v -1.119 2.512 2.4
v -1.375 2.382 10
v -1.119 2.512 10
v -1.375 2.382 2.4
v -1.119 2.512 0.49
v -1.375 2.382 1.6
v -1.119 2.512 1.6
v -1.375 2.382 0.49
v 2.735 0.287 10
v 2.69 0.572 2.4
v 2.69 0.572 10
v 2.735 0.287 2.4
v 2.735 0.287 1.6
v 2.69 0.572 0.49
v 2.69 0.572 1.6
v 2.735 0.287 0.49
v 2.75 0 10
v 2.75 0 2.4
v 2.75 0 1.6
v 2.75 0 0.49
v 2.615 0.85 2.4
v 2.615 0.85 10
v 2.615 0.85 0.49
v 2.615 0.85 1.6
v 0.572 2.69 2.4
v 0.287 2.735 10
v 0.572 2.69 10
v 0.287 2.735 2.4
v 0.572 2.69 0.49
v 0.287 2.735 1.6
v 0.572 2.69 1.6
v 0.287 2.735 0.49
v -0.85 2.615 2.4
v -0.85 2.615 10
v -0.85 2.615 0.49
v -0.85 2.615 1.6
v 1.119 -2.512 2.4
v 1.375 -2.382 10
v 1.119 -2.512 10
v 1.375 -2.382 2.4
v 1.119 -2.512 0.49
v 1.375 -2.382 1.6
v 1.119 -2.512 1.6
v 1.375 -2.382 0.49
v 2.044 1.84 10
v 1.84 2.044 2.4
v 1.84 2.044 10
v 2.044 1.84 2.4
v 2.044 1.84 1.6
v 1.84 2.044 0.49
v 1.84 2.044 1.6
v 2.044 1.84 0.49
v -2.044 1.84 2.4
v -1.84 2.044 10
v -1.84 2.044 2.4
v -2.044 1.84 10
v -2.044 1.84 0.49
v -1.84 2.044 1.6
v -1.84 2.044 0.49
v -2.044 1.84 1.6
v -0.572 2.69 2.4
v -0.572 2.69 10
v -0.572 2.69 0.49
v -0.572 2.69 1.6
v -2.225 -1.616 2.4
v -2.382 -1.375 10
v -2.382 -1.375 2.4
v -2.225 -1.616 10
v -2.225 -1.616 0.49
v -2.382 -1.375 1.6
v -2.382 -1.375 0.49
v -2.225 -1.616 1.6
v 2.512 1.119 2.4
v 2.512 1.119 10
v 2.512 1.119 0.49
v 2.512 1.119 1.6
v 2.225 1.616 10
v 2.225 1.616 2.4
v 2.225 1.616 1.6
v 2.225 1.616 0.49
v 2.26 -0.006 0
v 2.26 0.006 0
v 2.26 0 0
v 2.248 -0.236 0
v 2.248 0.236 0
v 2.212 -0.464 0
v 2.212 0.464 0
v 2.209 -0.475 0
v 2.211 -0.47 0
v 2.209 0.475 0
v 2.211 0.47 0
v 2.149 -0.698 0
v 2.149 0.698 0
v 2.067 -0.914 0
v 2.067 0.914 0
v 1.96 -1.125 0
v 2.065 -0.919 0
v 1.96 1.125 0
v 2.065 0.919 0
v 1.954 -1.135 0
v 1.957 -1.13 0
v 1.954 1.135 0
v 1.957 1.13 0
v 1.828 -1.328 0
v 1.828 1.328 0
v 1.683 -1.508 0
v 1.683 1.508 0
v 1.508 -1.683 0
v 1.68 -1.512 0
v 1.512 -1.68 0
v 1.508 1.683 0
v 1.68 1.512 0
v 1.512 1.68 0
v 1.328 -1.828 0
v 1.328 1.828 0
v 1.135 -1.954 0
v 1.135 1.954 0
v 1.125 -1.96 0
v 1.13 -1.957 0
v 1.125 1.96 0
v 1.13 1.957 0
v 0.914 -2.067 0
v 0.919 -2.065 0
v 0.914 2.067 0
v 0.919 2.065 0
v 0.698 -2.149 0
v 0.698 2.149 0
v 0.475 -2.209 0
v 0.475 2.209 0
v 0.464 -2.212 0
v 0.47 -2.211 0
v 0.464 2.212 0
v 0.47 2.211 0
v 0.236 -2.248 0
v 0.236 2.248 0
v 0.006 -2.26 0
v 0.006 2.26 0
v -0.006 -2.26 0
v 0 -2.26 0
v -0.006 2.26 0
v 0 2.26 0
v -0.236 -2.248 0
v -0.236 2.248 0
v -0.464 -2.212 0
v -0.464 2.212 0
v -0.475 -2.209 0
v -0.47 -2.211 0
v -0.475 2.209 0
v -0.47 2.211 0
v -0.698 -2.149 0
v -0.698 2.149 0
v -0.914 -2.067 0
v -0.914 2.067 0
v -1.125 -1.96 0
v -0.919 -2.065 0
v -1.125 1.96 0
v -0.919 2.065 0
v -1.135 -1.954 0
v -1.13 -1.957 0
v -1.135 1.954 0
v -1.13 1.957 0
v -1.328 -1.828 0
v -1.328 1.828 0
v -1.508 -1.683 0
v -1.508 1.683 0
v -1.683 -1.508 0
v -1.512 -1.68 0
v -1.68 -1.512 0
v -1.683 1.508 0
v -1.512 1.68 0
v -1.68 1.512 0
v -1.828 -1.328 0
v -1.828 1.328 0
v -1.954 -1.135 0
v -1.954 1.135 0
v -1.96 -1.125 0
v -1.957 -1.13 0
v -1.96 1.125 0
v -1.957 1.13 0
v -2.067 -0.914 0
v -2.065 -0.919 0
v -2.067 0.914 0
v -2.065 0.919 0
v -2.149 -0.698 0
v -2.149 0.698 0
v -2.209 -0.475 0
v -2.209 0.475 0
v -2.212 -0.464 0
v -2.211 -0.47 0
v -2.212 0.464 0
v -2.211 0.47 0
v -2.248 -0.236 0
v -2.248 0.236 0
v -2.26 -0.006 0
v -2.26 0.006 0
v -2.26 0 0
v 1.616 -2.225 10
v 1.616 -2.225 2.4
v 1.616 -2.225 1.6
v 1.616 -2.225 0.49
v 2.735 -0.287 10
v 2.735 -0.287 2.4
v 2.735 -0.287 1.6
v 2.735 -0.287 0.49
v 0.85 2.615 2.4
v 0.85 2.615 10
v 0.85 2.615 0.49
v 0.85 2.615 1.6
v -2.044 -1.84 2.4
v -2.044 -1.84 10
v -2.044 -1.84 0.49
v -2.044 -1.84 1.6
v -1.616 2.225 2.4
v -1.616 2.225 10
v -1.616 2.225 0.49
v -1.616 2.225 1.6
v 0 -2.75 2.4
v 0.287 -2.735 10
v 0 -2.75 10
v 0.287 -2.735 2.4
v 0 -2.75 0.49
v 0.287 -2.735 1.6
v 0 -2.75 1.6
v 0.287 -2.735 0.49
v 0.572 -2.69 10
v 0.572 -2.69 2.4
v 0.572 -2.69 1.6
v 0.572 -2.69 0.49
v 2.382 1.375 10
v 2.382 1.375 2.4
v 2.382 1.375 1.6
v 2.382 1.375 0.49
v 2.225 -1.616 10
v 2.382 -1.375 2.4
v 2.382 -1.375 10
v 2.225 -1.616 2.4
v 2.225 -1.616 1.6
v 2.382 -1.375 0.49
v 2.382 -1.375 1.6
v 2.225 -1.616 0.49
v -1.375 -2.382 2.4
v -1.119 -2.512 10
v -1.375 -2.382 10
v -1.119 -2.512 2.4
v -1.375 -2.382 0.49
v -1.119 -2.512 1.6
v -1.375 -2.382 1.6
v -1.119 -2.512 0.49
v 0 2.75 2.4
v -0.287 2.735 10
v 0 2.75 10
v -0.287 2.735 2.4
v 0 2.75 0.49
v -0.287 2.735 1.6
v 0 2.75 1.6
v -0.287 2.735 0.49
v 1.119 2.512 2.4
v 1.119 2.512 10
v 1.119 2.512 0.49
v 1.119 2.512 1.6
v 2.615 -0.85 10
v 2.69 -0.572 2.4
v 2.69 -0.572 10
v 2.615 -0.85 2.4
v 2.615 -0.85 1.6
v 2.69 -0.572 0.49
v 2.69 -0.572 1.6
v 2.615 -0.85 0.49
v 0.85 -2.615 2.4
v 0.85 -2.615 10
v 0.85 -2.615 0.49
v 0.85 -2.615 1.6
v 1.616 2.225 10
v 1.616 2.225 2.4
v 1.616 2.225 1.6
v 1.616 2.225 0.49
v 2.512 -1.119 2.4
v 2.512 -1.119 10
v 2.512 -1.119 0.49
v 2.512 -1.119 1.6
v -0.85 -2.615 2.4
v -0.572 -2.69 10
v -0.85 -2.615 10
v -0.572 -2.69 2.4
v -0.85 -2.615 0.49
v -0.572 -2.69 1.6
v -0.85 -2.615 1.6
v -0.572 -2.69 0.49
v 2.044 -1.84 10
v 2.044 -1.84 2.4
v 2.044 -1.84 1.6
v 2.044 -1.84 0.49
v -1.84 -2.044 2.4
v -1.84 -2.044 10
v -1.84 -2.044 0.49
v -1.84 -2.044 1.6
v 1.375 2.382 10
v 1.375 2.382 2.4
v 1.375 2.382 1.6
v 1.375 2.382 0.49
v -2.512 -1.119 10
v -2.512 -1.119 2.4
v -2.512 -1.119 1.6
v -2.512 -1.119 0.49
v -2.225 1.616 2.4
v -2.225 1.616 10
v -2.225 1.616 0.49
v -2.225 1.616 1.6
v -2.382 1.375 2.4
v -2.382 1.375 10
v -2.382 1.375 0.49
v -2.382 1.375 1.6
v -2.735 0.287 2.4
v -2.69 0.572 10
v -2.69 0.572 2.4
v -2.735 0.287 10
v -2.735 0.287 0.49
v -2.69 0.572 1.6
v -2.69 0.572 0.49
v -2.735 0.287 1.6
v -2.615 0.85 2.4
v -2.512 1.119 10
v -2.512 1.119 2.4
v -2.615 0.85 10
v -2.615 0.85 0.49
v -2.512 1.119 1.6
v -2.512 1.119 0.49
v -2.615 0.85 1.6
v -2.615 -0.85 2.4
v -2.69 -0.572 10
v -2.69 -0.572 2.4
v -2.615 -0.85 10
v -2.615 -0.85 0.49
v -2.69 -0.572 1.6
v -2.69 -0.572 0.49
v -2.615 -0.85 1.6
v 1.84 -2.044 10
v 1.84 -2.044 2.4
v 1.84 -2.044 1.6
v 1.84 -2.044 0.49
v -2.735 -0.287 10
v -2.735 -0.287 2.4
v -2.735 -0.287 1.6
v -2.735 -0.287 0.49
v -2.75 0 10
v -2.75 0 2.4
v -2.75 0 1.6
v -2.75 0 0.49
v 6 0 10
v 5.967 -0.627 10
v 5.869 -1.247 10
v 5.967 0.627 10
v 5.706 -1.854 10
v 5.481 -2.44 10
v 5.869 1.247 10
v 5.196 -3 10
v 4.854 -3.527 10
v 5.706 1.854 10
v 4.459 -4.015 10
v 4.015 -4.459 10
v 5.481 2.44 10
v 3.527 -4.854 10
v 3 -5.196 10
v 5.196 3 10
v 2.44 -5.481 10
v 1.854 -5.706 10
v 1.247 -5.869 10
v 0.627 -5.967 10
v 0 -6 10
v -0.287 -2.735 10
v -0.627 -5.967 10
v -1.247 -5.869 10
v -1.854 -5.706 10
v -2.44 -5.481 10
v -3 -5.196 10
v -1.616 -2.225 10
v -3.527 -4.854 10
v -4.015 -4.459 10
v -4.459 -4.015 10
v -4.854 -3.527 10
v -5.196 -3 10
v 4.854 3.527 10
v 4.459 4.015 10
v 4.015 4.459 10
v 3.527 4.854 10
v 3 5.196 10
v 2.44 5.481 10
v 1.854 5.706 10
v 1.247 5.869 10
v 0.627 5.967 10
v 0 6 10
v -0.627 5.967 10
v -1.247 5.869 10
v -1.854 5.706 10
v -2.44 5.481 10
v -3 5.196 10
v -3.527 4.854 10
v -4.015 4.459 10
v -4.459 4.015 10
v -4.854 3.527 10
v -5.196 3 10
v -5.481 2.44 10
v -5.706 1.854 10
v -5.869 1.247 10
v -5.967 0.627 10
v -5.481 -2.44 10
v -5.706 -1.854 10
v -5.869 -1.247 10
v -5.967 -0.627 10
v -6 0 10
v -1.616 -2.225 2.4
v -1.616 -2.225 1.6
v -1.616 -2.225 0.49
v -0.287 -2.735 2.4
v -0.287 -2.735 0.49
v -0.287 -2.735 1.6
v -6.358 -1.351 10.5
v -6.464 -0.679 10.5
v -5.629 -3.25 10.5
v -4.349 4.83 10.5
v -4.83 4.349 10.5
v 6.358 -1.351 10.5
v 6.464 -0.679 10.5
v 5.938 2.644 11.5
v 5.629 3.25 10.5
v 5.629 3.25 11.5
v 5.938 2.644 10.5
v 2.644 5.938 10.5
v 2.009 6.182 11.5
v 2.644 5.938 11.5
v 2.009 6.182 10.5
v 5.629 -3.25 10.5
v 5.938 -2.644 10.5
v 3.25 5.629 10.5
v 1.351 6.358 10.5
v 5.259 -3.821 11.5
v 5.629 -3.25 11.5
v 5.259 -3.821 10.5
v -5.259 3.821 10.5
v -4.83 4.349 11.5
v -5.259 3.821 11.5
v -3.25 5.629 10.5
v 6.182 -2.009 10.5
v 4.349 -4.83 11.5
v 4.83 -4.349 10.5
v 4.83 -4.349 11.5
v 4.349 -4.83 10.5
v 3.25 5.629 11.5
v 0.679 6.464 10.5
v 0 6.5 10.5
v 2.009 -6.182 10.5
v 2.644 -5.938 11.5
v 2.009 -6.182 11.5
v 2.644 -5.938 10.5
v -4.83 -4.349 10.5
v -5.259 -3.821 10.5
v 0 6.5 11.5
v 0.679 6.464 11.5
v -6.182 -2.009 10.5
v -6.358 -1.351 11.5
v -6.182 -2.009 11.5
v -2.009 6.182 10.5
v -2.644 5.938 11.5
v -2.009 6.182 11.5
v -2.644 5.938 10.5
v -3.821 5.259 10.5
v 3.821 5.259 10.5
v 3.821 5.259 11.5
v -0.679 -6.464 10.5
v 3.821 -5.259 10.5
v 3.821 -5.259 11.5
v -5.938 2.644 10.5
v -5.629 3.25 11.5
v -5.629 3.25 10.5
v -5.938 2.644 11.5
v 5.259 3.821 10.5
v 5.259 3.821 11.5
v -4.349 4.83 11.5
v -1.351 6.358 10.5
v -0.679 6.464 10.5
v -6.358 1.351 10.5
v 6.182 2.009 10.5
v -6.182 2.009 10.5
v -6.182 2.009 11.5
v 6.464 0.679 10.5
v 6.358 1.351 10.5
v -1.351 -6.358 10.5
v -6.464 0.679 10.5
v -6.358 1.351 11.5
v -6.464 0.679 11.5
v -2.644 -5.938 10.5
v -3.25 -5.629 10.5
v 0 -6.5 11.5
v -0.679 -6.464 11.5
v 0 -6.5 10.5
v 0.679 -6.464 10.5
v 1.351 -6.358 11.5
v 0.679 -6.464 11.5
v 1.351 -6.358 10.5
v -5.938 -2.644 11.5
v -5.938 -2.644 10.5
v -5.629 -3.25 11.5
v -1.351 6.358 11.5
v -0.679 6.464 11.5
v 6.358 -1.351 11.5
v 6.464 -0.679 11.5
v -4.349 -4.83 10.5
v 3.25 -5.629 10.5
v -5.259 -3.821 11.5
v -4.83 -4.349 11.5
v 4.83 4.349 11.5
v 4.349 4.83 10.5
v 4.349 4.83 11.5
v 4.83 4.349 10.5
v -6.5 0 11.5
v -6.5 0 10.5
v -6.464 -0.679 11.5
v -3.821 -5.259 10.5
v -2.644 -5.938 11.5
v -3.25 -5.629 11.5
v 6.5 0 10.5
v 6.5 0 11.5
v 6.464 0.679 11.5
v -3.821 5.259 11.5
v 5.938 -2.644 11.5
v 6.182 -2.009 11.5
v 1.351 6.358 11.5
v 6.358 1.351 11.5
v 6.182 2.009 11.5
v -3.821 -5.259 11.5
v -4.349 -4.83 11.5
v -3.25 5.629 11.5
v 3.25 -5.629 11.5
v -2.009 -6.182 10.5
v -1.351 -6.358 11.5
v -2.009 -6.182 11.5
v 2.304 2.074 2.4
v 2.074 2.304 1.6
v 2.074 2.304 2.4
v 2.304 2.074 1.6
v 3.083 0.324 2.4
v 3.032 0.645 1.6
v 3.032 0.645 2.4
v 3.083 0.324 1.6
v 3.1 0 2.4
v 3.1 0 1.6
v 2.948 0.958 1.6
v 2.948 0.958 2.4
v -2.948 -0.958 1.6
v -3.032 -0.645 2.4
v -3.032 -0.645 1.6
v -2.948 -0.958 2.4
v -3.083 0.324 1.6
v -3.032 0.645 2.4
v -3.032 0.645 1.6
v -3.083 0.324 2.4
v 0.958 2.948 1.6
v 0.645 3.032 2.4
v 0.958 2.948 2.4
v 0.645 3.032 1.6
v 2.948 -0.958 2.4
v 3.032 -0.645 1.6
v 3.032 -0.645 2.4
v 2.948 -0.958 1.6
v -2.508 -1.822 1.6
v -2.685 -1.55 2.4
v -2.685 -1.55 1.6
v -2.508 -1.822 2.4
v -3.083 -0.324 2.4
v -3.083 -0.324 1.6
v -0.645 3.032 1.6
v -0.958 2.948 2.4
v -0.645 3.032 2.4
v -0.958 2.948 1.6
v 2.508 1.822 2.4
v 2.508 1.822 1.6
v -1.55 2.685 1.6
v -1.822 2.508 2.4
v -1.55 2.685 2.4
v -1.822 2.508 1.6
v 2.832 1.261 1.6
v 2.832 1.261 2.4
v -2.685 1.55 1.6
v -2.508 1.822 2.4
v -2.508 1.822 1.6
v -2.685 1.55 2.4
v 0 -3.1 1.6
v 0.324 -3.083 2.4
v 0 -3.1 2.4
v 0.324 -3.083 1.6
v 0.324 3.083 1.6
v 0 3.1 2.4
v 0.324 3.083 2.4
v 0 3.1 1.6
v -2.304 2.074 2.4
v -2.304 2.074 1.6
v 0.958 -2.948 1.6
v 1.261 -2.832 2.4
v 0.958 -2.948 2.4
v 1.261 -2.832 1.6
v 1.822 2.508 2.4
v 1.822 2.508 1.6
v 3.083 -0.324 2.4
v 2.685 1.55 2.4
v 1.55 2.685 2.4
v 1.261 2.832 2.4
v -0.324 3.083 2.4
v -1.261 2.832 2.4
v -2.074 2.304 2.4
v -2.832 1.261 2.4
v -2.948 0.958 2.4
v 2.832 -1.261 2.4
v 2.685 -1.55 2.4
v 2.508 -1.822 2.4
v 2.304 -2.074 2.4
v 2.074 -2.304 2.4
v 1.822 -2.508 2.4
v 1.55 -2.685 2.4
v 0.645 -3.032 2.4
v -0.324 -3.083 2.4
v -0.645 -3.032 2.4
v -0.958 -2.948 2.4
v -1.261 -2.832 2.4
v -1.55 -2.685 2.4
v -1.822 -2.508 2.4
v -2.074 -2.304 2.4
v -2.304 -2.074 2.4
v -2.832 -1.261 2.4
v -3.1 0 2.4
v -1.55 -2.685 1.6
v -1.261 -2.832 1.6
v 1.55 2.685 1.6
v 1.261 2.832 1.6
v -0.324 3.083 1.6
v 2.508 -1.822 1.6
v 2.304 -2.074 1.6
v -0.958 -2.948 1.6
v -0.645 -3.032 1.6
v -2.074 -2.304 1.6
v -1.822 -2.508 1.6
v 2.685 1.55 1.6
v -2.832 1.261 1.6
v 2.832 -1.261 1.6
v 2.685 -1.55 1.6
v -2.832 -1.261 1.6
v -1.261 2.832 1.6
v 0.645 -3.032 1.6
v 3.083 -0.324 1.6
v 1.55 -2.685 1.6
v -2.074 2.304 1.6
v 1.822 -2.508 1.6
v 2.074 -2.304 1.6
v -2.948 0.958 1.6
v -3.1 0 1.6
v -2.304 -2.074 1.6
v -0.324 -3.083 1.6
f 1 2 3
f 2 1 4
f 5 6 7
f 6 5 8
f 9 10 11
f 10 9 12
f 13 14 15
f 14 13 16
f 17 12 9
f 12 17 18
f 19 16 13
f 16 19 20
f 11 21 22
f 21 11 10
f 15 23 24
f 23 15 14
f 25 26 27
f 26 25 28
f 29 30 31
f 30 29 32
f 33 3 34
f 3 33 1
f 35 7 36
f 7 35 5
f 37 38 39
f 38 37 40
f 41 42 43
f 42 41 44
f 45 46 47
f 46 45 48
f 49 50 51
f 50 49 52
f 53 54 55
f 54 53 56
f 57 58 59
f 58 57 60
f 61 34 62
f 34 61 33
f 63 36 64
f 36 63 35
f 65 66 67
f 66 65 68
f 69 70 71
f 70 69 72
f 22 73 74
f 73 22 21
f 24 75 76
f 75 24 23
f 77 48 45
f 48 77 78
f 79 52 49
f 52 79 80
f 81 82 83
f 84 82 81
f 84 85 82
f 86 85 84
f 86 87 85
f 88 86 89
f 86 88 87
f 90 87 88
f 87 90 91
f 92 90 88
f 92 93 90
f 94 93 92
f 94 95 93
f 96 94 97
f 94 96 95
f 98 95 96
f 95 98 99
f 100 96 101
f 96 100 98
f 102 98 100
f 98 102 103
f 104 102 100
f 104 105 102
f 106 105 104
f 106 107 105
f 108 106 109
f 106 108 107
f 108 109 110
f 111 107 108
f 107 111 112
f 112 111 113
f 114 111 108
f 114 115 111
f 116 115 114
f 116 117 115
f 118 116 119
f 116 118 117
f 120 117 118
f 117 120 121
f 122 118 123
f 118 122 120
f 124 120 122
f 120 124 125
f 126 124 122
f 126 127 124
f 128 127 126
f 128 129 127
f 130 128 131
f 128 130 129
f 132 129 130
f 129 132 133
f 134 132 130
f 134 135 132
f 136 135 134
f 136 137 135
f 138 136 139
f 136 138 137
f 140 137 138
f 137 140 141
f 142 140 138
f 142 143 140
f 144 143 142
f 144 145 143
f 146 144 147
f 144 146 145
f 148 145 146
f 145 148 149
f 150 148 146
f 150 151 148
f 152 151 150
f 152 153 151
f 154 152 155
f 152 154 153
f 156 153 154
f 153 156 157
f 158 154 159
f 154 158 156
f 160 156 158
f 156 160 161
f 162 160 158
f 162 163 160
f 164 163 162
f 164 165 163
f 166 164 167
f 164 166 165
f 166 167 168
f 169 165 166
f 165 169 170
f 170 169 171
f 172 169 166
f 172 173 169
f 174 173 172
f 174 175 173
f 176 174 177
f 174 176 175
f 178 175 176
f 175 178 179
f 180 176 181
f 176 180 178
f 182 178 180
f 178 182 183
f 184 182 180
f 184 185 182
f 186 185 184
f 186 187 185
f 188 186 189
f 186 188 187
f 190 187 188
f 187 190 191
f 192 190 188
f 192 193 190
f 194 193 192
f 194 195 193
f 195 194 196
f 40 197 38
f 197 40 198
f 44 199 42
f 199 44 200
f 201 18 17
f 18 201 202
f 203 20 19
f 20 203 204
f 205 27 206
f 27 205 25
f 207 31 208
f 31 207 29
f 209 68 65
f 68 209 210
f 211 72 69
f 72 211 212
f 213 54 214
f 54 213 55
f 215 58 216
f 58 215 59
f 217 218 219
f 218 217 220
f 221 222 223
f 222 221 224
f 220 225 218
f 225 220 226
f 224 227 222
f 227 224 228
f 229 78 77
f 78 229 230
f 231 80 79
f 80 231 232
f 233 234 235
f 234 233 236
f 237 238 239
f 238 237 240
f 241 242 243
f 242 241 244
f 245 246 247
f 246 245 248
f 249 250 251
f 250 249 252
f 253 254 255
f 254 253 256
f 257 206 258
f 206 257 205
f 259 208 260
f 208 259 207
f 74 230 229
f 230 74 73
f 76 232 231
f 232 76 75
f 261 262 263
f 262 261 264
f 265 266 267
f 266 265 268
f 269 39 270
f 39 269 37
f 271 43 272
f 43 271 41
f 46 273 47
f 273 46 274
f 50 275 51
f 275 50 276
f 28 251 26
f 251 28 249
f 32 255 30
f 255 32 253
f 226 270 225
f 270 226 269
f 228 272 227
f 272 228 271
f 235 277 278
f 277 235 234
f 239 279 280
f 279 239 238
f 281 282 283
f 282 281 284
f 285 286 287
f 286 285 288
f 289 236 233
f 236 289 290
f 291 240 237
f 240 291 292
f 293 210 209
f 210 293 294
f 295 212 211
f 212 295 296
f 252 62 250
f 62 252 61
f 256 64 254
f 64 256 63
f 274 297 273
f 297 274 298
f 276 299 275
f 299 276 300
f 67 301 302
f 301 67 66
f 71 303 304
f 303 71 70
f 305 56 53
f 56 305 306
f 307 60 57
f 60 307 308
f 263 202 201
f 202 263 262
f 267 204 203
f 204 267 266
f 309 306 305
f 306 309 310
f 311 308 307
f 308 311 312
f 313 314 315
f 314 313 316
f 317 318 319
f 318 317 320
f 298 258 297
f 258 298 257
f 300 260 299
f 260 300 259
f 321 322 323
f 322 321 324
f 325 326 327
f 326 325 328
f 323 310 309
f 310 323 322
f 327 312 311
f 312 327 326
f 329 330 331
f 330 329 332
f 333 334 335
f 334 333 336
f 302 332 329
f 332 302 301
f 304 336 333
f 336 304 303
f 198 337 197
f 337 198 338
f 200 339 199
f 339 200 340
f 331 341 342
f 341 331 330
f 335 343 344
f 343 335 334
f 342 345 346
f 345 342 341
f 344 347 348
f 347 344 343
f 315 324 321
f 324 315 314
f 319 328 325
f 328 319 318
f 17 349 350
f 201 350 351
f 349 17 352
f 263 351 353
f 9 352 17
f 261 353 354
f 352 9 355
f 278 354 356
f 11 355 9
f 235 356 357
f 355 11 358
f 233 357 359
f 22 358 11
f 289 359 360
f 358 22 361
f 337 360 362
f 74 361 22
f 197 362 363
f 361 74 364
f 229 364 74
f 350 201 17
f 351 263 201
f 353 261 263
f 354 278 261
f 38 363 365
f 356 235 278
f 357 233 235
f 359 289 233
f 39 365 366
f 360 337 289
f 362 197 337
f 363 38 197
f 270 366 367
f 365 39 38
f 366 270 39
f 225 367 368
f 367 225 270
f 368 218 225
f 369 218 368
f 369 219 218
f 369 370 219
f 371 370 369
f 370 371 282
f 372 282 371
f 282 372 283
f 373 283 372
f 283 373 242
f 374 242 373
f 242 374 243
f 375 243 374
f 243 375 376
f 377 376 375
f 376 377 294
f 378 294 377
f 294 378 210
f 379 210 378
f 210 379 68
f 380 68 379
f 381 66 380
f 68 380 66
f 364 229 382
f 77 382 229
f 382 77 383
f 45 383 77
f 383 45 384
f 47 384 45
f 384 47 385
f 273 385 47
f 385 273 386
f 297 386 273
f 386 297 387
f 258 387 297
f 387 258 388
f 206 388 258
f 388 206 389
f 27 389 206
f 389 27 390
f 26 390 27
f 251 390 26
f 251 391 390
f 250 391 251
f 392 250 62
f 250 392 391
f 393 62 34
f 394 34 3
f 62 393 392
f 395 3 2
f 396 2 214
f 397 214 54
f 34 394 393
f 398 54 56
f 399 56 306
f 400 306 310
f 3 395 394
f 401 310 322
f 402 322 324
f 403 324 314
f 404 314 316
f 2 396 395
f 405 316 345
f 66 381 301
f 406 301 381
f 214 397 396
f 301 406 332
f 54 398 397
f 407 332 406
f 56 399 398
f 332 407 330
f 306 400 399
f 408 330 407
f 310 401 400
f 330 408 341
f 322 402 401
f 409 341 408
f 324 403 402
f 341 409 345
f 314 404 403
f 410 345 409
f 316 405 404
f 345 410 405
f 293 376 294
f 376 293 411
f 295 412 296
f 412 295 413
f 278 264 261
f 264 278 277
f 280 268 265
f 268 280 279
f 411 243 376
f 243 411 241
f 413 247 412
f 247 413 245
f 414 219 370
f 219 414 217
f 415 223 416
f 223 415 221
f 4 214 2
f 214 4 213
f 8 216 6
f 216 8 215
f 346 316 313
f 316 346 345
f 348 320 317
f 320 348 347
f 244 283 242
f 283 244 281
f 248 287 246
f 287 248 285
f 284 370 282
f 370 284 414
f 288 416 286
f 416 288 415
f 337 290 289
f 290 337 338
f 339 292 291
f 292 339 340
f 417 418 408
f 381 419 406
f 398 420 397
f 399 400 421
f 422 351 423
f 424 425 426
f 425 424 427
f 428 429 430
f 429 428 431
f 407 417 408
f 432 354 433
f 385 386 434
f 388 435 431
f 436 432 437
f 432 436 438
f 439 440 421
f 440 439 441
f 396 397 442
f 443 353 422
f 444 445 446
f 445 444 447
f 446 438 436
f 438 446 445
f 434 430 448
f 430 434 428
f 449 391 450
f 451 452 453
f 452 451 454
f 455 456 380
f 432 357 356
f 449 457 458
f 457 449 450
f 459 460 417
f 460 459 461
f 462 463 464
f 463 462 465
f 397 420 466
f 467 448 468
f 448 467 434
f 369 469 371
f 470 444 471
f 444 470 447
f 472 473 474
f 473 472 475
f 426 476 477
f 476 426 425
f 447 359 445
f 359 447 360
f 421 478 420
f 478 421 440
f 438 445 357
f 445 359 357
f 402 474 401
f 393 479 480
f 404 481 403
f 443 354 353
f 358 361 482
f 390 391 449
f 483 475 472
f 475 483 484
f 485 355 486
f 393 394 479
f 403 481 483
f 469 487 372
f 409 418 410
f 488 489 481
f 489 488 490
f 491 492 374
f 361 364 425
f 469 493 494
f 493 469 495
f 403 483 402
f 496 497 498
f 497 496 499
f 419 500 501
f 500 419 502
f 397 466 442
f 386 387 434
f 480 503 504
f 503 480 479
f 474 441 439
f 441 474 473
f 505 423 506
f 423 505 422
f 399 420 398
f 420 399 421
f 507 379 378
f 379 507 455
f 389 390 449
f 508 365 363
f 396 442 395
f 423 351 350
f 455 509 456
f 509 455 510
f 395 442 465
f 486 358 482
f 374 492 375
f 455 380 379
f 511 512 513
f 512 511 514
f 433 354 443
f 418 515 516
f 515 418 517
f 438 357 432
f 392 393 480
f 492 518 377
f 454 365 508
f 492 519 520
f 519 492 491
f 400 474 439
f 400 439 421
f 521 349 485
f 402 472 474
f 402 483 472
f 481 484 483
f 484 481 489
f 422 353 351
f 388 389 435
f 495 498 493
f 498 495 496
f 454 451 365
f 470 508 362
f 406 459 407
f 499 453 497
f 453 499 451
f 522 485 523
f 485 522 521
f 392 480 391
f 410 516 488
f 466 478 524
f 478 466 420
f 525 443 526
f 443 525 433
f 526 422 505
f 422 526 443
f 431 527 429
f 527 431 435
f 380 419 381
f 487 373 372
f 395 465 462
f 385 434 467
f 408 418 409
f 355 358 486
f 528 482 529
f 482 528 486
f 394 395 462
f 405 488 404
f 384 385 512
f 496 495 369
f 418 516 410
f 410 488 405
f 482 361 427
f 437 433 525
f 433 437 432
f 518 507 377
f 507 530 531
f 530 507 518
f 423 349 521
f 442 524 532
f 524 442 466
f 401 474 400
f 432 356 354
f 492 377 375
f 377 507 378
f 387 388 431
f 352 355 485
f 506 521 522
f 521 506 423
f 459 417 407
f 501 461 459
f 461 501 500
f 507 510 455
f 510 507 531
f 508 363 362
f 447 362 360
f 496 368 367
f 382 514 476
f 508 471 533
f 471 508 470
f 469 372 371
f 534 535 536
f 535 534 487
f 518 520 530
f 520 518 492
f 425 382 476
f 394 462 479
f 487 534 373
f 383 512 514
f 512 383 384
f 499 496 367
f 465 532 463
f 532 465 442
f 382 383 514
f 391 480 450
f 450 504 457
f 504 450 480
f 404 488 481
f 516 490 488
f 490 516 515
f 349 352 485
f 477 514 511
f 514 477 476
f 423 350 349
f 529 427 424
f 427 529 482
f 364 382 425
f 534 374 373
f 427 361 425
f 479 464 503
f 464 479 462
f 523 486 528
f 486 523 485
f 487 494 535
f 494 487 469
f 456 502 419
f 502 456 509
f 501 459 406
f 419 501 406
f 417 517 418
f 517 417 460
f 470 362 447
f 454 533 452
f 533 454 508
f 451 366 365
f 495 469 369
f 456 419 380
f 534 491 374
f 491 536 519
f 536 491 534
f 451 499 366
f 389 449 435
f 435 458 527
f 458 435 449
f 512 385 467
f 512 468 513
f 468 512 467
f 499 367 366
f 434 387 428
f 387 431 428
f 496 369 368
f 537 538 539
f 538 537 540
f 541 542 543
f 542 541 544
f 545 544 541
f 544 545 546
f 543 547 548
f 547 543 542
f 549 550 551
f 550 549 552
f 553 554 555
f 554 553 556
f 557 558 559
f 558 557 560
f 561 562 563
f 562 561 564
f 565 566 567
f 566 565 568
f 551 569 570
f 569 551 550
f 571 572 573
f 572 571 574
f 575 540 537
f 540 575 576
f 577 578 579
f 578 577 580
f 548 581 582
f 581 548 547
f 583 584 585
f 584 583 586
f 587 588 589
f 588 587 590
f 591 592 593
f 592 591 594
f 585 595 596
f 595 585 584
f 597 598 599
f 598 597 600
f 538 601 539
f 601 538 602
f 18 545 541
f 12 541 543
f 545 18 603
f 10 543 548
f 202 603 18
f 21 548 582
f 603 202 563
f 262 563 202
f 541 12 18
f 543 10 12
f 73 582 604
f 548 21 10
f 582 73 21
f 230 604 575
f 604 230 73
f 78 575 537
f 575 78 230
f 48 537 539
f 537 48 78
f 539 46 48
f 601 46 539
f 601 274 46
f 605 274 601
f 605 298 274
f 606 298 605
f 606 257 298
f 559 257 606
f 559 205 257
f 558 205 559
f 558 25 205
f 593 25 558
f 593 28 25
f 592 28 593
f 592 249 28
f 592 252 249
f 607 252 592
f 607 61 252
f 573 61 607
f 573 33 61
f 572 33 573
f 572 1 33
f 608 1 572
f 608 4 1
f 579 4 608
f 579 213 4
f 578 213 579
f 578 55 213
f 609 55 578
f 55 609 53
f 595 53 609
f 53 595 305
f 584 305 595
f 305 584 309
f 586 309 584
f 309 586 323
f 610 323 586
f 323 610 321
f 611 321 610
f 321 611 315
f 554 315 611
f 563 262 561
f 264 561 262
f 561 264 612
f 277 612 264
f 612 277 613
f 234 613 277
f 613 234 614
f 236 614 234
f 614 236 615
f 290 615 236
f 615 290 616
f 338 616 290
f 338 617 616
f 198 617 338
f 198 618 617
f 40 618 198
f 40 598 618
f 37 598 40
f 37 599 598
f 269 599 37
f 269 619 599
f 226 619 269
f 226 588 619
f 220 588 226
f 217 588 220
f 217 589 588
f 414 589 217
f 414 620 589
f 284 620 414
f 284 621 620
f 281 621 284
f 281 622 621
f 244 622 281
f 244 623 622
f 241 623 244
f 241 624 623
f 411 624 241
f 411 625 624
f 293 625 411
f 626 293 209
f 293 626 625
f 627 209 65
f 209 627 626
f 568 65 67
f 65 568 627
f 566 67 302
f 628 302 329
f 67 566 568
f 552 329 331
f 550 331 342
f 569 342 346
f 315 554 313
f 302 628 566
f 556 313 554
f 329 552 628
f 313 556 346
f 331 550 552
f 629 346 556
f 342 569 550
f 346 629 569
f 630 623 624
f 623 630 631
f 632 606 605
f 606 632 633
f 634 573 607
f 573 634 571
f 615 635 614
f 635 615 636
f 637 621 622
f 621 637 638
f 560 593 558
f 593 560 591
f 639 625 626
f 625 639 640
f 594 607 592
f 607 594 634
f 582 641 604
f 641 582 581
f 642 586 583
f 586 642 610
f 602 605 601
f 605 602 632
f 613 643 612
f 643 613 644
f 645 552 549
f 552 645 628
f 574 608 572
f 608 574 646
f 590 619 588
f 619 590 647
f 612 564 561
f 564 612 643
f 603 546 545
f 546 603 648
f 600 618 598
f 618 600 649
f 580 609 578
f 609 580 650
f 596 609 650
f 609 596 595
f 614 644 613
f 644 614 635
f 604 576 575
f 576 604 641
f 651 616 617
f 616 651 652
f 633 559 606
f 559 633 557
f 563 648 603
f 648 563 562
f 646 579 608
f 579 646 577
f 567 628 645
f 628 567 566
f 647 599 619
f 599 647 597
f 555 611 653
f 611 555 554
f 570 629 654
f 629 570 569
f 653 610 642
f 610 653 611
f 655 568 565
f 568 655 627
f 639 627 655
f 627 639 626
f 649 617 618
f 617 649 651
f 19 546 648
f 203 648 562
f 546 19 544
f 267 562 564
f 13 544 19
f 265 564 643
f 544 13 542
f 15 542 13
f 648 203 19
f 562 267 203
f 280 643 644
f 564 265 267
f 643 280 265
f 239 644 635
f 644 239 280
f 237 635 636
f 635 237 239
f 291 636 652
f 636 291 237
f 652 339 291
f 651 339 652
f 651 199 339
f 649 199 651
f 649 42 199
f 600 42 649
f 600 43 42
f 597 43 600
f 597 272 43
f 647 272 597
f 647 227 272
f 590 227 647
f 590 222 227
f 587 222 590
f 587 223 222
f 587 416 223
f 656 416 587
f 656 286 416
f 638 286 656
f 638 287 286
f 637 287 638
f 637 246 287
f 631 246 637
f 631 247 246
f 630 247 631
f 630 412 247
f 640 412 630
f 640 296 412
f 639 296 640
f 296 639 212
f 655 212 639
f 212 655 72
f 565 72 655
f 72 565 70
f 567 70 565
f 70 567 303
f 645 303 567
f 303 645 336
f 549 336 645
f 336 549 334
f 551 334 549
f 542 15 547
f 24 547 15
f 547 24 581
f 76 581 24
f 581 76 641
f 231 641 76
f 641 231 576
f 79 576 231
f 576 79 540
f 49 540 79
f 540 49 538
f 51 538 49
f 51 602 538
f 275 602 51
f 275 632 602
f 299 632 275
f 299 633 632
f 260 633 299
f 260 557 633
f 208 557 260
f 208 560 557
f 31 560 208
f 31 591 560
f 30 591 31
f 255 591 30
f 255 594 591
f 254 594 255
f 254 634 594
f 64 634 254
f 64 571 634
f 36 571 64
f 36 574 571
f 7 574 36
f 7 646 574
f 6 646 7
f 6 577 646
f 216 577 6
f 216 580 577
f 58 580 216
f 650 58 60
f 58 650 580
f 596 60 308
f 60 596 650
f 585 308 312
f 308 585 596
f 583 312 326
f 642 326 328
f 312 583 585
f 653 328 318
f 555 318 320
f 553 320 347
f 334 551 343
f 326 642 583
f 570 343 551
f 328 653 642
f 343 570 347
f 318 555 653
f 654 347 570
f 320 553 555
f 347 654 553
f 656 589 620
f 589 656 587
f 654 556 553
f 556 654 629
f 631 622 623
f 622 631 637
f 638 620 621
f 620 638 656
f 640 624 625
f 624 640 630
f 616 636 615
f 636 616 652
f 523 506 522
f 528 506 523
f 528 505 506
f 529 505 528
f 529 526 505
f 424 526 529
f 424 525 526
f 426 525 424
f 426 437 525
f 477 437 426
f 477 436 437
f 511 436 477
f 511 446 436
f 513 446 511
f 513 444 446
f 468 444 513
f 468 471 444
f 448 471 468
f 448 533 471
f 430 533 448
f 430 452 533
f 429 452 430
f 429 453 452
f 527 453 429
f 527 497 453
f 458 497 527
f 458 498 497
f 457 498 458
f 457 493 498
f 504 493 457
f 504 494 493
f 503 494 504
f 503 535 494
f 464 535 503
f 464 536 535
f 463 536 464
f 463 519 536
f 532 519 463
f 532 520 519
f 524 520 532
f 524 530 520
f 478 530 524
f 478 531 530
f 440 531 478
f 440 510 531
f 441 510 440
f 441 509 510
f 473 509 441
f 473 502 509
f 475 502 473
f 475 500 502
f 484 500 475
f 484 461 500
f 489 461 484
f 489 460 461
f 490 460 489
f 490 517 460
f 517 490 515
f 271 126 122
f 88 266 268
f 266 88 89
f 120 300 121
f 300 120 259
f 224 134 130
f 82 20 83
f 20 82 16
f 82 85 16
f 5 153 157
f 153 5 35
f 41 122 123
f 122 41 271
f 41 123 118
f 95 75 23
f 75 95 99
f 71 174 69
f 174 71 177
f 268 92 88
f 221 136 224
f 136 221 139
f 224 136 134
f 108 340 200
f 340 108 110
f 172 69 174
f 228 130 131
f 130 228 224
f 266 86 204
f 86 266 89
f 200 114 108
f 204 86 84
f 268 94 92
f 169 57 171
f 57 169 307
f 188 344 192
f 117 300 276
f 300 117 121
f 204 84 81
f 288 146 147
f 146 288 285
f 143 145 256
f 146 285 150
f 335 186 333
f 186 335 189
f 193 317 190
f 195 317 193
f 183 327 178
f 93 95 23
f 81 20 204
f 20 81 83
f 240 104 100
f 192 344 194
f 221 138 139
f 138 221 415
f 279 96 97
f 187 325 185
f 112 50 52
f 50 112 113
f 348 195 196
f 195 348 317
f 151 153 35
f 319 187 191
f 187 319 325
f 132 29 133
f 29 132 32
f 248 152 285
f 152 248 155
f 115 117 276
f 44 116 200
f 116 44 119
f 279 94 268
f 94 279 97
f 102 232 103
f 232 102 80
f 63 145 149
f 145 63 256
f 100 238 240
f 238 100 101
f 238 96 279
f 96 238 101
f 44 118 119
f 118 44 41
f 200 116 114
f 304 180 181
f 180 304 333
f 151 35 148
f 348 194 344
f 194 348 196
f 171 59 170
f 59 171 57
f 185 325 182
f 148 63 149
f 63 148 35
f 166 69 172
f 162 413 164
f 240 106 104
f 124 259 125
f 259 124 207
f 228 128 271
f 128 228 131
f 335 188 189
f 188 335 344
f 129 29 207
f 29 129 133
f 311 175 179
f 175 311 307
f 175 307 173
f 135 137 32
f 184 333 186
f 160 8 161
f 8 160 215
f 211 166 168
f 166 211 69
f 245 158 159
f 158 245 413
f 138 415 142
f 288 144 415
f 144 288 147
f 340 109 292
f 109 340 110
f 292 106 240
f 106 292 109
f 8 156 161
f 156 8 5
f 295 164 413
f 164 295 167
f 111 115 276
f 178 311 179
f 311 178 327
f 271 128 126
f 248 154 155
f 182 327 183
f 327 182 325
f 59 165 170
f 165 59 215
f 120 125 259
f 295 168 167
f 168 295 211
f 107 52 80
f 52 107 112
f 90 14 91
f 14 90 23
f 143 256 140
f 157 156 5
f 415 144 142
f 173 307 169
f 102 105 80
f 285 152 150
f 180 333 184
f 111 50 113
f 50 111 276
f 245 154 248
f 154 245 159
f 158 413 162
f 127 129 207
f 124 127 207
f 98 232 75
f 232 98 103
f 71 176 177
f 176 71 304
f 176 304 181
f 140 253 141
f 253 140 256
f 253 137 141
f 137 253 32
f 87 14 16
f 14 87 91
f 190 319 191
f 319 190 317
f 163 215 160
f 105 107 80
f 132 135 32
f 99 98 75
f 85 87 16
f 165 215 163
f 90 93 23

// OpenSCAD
// ============================================================================
// spring_contact_pad.scad - Spring-Loaded Contact Tip for Gripper Finger
// Part of HYDRA GRASP system for STEVAL-ROBKIT1
// All dimensions in mm
//
// PRINT ORIENTATION: Print standing upright (contact face up).
// The cylindrical body prints well vertically. The thin FSR disc at the
// top may need careful first-layer adhesion.
//
// QUANTITY: Print 2 (one per finger)
//
// Print Settings: 0.16mm layer height, 3 perimeters, 40% infill, PLA/PETG
// Use fine layer height for the thin contact disc.
// ============================================================================

$fn = 60;

// ========================= PARAMETERS =======================================

// Overall dimensions
pad_diameter  = 5.5;   // body diameter (fits in 6mm socket with 0.5mm clearance)
total_length  = 12;    // total pad length

// Contact surface (wider disc at top)
contact_dia    = 13;    // matches FSR diameter, wider than body
contact_thick  = 2;     // thickness of the contact disc
contact_chamfer = 0.5;  // chamfer on the disc edge

// Cylindrical body
body_length = total_length - contact_thick;   // 10mm body

// FSR pocket on contact face
fsr_pocket_dia   = 13;    // same as contact_dia
fsr_pocket_depth = 0.5;

// Electrode grooves on contact face
electrode_width   = 7;
electrode_depth   = 0.5;
electrode_spacing = 3;   // gap between grooves

// Spring retention lip
lip_height   = 2;     // height from bottom where lip is located
lip_diameter = 6.2;   // slightly wider than socket ID to retain spring
lip_width    = 0.8;   // how tall the lip ring is

// Spring reference
spring_od     = 5;     // spring outer diameter
spring_length = 10;    // free length of spring

// ========================= MODULES ==========================================

// Main cylindrical body
module pad_body() {
    // Lower cylindrical shaft (slides in the socket)
    cylinder(d = pad_diameter, h = body_length);

    // Contact disc at the top (wider than body)
    translate([0, 0, body_length]) {
        // Chamfered disc using hull
        hull() {
            cylinder(d = contact_dia - 2 * contact_chamfer,
                     h = contact_thick);
            translate([0, 0, contact_chamfer])
                cylinder(d = contact_dia,
                         h = contact_thick - contact_chamfer);
        }
    }
}

// FSR pocket on the contact face (top)
module fsr_pocket() {
    translate([0, 0, total_length - fsr_pocket_depth])
        cylinder(d = fsr_pocket_dia, h = fsr_pocket_depth + 1);
}

// Electrode grooves on the contact face
module electrode_grooves() {
    translate([0, 0, total_length - electrode_depth]) {
        // Groove 1
        translate([-electrode_width / 2,
                   -contact_dia / 2, 0])
            cube([electrode_width, (contact_dia - electrode_spacing) / 2,
                  electrode_depth + 1]);

        // Groove 2
        translate([-electrode_width / 2,
                   electrode_spacing / 2, 0])
            cube([electrode_width, (contact_dia - electrode_spacing) / 2,
                  electrode_depth + 1]);
    }
}

// Spring retention lip (a small ring/ridge near the bottom)
module spring_lip() {
    translate([0, 0, lip_height - lip_width / 2])
        cylinder(d = lip_diameter, h = lip_width);
}

// Chamfer at the bottom for easy insertion
module bottom_chamfer() {
    chamfer = 0.5;
    translate([0, 0, -0.01])
        difference() {
            cylinder(d = pad_diameter + 1, h = chamfer);
            cylinder(d1 = pad_diameter - 2 * chamfer, d2 = pad_diameter,
                     h = chamfer);
        }
}

// ========================= MAIN ASSEMBLY ====================================

module spring_contact_pad() {
    difference() {
        union() {
            // Main body with contact disc
            pad_body();

            // Spring retention lip
            spring_lip();
        }

        // FSR pocket on contact face
        fsr_pocket();

        // Electrode grooves
        electrode_grooves();

        // Bottom chamfer for easy insertion into socket
        bottom_chamfer();
    }
}

// Render
spring_contact_pad();

// Optional: uncomment to see spring for reference (not part of print)
// %translate([0, 0, -spring_length])
//     difference() {
//         cylinder(d = spring_od, h = spring_length);
//         translate([0, 0, -1])
//             cylinder(d = spring_od - 1.0, h = spring_length + 2);
//     }
